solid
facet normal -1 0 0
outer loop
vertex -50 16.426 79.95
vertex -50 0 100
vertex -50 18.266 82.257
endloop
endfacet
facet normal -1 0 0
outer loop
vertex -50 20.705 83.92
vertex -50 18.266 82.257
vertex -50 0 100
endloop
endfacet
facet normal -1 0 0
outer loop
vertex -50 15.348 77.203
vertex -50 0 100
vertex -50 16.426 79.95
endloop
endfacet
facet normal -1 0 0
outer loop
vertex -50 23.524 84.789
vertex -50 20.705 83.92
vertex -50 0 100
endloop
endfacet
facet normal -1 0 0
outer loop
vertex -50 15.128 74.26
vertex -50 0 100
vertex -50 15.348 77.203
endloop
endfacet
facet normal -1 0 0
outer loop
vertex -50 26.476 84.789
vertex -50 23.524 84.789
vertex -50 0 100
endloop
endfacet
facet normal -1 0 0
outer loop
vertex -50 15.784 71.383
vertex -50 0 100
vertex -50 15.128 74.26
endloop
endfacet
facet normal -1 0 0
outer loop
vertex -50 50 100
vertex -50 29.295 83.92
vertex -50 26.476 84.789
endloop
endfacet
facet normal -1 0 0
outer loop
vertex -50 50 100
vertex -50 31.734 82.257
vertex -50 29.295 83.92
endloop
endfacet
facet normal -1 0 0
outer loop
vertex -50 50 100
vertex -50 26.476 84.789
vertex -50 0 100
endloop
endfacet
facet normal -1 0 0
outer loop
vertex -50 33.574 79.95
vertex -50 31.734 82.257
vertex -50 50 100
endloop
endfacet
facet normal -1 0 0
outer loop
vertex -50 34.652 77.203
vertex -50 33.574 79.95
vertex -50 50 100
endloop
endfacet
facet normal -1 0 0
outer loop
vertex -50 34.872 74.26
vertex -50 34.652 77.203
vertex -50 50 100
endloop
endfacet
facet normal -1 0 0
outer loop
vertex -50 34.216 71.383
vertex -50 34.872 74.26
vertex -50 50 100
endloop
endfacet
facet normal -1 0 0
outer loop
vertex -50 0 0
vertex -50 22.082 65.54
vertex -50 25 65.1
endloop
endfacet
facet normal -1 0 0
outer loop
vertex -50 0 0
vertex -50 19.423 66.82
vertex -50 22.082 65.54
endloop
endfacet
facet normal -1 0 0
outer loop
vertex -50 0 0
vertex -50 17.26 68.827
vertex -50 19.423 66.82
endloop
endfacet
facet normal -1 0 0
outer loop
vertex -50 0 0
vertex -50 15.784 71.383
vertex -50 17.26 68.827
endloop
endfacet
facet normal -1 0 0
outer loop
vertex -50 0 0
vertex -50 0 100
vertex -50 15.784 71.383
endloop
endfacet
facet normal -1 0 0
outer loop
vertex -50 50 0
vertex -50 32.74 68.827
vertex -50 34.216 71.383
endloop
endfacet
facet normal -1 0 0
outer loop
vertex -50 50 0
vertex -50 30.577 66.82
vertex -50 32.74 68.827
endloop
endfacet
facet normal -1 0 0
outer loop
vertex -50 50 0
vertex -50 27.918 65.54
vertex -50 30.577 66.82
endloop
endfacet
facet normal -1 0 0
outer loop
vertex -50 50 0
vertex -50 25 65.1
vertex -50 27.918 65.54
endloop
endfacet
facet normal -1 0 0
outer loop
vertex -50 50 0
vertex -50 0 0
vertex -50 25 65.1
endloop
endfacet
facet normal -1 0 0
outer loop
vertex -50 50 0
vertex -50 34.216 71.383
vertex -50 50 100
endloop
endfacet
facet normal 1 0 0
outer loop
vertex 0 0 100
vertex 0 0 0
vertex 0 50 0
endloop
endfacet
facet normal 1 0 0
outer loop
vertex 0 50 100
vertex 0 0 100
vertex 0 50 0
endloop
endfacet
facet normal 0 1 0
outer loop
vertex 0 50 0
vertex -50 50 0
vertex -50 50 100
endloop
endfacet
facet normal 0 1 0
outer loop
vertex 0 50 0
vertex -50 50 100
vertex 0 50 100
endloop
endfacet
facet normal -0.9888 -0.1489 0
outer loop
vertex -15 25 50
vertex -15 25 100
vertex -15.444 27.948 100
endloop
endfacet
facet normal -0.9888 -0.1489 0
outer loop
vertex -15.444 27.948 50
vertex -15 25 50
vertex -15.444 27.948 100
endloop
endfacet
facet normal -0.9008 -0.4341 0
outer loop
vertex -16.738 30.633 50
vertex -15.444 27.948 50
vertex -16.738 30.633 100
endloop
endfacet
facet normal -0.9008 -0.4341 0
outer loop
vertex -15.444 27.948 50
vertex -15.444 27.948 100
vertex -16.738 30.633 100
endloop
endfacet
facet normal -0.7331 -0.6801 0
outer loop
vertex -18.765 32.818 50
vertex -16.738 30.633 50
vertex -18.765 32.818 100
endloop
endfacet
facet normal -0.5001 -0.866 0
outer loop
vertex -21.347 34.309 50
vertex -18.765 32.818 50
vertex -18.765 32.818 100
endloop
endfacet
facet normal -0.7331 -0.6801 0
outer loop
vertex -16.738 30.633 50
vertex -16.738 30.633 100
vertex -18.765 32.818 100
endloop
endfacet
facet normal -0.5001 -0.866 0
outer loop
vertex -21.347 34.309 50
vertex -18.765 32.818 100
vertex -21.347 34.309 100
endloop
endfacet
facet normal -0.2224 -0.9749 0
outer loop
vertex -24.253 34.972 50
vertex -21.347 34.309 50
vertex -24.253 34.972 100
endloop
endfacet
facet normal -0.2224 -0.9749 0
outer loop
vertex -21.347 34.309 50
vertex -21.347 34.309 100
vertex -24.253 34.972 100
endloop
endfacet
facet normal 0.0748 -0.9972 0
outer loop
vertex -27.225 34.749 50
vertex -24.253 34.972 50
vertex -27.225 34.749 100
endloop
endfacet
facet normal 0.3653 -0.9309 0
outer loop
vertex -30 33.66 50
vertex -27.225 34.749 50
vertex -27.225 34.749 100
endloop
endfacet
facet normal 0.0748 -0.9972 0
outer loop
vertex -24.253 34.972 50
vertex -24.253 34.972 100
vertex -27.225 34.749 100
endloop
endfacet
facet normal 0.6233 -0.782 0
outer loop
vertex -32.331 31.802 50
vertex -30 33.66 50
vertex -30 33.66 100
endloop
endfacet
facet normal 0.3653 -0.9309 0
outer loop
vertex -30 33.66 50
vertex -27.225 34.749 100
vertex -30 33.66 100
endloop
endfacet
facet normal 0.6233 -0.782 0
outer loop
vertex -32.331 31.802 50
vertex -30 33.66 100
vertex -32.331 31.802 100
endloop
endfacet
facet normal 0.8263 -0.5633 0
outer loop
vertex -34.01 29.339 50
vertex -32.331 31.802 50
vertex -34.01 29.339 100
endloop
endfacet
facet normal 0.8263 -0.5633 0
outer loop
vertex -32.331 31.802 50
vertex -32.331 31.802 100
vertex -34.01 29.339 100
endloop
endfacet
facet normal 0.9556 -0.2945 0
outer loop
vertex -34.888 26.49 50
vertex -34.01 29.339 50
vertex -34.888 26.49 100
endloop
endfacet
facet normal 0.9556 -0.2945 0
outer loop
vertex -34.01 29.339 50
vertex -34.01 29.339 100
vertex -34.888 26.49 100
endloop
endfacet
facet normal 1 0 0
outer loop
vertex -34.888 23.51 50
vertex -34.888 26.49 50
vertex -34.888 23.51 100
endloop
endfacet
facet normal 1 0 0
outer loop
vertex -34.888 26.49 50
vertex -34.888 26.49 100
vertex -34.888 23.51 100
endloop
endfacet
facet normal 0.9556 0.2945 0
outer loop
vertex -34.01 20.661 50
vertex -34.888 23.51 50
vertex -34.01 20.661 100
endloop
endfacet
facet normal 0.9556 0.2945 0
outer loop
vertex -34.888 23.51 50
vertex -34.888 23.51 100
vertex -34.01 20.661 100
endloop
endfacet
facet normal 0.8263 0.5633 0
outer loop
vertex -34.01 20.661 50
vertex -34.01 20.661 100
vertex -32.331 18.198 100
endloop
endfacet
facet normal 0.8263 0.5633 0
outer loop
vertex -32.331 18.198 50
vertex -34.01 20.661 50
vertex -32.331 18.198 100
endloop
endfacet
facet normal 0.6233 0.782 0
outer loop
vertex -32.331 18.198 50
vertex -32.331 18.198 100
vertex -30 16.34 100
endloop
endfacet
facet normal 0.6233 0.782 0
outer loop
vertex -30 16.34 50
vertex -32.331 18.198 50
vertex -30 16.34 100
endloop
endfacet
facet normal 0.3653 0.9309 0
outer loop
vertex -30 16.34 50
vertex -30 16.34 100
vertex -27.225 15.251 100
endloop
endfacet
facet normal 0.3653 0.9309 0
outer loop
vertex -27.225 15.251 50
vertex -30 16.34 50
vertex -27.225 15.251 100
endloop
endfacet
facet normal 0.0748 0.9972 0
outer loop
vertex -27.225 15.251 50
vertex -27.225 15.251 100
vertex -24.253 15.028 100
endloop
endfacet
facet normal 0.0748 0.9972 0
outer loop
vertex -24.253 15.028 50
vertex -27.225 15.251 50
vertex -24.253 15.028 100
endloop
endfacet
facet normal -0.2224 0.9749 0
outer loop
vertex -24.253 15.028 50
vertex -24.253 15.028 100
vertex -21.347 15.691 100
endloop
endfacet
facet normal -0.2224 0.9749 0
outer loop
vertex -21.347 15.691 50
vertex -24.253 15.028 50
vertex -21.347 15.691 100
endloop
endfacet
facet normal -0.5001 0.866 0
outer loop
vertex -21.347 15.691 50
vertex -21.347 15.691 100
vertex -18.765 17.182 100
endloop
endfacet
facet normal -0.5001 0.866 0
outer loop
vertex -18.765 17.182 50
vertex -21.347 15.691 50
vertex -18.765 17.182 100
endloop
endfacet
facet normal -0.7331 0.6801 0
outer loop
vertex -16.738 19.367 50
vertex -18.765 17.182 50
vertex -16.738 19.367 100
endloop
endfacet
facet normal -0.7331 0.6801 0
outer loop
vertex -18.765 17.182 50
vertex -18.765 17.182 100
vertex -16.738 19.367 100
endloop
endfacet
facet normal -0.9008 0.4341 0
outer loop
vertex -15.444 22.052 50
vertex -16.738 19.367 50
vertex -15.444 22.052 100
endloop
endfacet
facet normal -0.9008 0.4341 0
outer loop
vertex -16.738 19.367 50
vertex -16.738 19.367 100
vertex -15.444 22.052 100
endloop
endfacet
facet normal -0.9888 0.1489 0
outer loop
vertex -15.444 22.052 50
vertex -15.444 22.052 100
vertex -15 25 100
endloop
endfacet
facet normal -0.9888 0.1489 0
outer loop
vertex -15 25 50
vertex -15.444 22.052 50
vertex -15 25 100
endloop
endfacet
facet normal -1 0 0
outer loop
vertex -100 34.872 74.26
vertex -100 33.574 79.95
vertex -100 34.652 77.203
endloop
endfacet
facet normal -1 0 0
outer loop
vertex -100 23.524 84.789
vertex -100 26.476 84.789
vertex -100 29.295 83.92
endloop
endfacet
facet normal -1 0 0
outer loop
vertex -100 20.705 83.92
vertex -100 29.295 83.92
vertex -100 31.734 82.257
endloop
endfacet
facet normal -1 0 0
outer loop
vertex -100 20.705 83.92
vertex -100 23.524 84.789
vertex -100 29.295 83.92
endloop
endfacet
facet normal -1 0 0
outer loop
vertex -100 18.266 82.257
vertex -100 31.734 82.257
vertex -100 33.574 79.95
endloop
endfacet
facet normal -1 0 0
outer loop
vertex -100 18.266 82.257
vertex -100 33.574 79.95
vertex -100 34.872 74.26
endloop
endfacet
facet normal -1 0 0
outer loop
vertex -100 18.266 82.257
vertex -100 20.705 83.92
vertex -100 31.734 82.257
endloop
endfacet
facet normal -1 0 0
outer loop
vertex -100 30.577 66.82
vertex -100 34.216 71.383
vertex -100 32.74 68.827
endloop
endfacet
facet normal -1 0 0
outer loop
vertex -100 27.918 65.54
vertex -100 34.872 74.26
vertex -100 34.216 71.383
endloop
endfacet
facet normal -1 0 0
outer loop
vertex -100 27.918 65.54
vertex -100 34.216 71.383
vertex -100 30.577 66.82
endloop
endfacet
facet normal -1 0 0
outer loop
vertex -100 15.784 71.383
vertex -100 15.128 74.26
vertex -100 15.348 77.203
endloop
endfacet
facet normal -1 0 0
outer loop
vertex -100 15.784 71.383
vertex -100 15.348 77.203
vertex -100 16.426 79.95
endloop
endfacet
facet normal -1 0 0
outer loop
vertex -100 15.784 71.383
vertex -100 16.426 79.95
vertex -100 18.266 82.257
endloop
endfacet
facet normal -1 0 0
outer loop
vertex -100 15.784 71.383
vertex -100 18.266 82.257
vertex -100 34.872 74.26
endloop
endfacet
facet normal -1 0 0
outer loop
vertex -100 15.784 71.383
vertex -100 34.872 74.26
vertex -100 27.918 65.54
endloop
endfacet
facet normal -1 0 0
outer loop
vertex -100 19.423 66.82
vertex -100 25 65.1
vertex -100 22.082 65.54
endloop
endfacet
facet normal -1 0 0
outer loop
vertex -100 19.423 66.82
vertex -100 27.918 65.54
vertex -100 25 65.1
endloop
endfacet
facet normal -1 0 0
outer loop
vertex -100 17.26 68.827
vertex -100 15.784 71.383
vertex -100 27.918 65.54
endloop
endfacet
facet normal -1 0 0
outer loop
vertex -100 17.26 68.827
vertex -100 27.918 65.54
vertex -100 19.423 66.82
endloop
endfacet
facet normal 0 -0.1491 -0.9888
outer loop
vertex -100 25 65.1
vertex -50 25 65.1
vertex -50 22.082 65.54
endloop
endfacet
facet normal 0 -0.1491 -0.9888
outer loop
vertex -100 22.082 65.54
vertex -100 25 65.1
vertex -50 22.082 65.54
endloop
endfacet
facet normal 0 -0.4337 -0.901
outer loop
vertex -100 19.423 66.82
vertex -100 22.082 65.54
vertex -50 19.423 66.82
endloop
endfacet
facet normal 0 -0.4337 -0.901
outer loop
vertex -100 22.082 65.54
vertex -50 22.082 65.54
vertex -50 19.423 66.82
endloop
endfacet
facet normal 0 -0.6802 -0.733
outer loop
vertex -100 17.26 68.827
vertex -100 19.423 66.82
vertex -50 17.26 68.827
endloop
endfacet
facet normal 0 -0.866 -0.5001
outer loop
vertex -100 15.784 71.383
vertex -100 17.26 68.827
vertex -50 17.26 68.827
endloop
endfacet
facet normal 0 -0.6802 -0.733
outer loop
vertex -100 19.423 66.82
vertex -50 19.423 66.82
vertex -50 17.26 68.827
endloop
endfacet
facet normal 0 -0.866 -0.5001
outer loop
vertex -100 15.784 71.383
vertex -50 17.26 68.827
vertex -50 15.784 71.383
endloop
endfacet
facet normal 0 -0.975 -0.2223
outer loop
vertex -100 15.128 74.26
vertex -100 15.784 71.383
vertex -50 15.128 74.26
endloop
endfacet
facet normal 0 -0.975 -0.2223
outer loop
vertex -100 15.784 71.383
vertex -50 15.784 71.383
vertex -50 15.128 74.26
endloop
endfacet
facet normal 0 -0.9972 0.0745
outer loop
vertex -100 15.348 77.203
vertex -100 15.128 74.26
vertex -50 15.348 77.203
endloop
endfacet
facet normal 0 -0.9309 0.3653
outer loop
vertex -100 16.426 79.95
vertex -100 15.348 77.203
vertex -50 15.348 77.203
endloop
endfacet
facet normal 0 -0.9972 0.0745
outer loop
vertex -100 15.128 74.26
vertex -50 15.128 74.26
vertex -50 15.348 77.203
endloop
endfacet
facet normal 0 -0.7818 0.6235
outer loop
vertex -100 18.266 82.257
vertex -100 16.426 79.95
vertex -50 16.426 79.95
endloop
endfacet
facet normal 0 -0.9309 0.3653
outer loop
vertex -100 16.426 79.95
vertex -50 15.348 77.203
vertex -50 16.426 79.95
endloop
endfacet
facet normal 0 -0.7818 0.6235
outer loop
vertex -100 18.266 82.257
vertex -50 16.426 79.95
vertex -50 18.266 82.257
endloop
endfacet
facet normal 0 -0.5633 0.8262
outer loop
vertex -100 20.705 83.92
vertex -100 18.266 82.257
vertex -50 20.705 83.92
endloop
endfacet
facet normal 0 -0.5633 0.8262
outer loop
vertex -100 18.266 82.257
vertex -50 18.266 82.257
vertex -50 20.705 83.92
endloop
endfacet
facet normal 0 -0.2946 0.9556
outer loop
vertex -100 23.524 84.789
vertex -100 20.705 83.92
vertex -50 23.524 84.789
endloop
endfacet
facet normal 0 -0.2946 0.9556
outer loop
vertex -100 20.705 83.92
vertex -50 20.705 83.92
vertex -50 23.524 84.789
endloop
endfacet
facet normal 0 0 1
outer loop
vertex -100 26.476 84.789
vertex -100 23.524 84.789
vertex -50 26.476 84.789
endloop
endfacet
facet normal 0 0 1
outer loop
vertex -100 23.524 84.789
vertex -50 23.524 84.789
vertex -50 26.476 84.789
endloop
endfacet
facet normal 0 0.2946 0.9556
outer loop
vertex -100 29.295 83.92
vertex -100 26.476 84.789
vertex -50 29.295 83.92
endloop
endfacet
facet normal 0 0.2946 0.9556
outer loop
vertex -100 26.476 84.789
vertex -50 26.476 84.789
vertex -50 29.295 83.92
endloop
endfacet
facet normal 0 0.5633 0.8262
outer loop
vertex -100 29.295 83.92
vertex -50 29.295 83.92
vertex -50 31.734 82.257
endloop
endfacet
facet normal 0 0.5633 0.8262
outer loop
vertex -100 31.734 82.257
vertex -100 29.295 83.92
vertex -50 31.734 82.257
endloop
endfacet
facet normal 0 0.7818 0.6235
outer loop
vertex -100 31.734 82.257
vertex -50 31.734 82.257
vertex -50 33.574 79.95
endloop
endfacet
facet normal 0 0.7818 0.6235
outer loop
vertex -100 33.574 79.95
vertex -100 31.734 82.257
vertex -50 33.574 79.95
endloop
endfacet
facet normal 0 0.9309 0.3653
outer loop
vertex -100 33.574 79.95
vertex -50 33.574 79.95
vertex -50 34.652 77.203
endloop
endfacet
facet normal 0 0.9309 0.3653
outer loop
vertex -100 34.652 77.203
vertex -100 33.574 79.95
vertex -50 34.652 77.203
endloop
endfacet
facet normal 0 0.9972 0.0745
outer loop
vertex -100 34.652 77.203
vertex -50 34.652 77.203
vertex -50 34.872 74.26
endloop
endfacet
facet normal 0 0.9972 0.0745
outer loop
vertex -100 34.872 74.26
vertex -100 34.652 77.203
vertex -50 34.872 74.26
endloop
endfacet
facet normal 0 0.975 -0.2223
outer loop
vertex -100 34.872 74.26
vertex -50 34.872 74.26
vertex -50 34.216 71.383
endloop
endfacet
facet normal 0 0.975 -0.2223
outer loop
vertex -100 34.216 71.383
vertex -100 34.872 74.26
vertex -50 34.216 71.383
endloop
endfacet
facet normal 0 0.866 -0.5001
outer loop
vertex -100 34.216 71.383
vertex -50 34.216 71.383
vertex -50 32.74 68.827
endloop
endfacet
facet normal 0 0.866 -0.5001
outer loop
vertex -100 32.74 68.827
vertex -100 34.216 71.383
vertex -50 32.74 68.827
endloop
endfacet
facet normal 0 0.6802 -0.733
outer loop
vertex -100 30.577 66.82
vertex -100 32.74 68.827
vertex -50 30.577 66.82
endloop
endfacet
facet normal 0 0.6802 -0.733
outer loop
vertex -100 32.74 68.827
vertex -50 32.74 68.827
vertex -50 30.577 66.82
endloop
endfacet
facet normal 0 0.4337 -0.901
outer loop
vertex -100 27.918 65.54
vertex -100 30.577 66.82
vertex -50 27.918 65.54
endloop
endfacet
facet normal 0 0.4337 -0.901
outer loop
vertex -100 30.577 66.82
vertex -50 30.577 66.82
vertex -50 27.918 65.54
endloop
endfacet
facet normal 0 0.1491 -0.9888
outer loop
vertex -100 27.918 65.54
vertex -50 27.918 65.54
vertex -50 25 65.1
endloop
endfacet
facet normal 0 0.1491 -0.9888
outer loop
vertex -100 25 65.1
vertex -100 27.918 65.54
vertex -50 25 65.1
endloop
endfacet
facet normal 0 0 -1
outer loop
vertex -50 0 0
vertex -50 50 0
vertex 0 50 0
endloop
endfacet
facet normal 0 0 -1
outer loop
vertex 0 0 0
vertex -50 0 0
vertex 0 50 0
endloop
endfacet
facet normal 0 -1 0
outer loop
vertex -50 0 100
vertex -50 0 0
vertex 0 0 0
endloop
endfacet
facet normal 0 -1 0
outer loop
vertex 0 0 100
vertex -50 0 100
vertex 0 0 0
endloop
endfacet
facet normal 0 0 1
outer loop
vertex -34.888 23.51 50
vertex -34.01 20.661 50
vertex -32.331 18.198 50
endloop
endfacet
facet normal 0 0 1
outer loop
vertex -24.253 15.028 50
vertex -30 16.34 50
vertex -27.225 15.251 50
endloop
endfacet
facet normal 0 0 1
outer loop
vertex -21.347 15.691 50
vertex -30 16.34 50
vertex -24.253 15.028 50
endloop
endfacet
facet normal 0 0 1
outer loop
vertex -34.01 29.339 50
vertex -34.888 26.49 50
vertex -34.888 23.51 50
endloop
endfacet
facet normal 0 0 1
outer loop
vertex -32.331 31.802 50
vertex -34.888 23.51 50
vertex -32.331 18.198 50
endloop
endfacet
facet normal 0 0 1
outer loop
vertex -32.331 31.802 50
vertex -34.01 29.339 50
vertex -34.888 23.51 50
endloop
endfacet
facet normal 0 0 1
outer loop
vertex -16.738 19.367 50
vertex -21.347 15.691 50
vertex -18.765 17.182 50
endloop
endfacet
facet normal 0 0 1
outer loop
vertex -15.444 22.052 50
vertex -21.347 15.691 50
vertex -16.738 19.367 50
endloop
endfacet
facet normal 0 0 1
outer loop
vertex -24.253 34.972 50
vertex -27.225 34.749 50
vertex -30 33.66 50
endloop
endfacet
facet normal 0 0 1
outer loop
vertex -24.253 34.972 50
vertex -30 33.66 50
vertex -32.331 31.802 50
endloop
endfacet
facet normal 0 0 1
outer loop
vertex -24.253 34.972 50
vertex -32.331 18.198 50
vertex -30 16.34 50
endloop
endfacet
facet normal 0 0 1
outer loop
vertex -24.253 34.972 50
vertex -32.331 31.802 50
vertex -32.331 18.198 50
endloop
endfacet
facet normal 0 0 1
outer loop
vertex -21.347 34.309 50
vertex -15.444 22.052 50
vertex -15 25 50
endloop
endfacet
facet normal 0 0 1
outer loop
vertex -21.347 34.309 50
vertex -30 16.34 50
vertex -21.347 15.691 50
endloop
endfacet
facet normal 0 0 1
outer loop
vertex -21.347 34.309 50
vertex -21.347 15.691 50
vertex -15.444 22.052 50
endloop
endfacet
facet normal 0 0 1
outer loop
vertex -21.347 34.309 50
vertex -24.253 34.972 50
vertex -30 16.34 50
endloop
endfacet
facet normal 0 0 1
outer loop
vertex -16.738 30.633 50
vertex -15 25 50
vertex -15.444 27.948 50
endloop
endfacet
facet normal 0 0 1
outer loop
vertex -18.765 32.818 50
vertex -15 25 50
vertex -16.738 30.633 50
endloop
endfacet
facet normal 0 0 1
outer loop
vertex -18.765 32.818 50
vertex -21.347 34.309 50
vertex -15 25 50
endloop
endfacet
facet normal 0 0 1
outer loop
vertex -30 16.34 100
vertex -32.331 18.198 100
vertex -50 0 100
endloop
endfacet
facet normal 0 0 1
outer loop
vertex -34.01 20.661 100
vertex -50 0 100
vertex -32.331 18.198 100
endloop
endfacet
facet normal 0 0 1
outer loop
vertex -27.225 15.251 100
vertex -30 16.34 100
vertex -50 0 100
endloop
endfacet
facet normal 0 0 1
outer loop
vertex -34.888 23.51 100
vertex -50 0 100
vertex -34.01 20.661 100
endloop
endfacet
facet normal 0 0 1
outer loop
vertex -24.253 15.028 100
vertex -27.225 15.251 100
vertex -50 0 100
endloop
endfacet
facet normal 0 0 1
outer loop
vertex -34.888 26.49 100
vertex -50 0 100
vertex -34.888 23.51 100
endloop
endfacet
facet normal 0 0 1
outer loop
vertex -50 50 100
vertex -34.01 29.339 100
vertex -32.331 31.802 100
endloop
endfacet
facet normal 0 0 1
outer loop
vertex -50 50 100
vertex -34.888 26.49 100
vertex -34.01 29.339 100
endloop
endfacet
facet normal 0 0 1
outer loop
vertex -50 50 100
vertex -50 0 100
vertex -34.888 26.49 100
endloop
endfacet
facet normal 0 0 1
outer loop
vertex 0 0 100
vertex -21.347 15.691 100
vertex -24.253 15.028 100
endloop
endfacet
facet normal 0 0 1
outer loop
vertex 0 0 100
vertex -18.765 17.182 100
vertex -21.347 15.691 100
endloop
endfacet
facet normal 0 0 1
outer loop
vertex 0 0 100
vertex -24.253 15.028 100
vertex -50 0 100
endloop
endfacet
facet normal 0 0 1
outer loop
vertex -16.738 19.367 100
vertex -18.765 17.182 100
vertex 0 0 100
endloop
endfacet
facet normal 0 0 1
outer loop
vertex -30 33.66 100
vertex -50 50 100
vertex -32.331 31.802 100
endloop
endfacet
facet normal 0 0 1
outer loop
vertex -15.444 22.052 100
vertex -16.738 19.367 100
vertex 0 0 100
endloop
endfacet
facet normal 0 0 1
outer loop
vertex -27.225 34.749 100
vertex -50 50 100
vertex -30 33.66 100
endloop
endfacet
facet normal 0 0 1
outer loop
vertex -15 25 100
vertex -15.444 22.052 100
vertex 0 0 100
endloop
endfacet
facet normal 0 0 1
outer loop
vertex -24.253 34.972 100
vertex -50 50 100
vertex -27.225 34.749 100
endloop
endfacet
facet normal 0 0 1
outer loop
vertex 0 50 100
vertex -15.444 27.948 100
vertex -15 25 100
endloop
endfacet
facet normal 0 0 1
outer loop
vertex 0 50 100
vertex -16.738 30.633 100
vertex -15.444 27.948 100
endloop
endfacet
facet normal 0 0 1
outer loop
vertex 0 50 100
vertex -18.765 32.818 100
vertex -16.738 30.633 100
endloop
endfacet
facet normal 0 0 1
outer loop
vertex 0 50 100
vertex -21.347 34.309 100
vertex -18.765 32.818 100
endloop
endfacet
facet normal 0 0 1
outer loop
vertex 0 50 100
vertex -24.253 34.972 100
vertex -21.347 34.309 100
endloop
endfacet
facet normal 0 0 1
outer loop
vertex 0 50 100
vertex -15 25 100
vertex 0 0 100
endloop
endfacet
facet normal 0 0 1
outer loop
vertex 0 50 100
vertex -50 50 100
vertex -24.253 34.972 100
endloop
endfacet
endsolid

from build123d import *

# Parameters (mm, degrees)
SKETCH1_W           = 50
SKETCH1_H           = 50
BOSS_EXTRUDE1_DEPTH = 100
SKETCH2_R           = 9.9
BOSS_EXTRUDE2_DEPTH = 50
SKETCH3_R           = 10
CUT_EXTRUDE1_DEPTH  = 50


with BuildPart() as part:
    # Sketch1 → Boss-Extrude1 (new body)
    with BuildSketch(Plane.XY):
        with Locations((-25, 25)):
            Rectangle(SKETCH1_W, SKETCH1_H)
    extrude(amount=BOSS_EXTRUDE1_DEPTH)

    # Sketch2 → Boss-Extrude2 (add)
    with BuildSketch(Plane.ZY.offset(50)):
        with Locations(Location((75, 25, 0), (0, 0, 180))):
            Circle(SKETCH2_R)
    extrude(amount=BOSS_EXTRUDE2_DEPTH)

    # Sketch3 → Cut-Extrude1 (cut)
    with BuildSketch(Plane.XY.offset(100)):
        with Locations((-25, 25)):
            Circle(SKETCH3_R)
    extrude(amount=-CUT_EXTRUDE1_DEPTH, mode=Mode.SUBTRACT)


solid = part.part
